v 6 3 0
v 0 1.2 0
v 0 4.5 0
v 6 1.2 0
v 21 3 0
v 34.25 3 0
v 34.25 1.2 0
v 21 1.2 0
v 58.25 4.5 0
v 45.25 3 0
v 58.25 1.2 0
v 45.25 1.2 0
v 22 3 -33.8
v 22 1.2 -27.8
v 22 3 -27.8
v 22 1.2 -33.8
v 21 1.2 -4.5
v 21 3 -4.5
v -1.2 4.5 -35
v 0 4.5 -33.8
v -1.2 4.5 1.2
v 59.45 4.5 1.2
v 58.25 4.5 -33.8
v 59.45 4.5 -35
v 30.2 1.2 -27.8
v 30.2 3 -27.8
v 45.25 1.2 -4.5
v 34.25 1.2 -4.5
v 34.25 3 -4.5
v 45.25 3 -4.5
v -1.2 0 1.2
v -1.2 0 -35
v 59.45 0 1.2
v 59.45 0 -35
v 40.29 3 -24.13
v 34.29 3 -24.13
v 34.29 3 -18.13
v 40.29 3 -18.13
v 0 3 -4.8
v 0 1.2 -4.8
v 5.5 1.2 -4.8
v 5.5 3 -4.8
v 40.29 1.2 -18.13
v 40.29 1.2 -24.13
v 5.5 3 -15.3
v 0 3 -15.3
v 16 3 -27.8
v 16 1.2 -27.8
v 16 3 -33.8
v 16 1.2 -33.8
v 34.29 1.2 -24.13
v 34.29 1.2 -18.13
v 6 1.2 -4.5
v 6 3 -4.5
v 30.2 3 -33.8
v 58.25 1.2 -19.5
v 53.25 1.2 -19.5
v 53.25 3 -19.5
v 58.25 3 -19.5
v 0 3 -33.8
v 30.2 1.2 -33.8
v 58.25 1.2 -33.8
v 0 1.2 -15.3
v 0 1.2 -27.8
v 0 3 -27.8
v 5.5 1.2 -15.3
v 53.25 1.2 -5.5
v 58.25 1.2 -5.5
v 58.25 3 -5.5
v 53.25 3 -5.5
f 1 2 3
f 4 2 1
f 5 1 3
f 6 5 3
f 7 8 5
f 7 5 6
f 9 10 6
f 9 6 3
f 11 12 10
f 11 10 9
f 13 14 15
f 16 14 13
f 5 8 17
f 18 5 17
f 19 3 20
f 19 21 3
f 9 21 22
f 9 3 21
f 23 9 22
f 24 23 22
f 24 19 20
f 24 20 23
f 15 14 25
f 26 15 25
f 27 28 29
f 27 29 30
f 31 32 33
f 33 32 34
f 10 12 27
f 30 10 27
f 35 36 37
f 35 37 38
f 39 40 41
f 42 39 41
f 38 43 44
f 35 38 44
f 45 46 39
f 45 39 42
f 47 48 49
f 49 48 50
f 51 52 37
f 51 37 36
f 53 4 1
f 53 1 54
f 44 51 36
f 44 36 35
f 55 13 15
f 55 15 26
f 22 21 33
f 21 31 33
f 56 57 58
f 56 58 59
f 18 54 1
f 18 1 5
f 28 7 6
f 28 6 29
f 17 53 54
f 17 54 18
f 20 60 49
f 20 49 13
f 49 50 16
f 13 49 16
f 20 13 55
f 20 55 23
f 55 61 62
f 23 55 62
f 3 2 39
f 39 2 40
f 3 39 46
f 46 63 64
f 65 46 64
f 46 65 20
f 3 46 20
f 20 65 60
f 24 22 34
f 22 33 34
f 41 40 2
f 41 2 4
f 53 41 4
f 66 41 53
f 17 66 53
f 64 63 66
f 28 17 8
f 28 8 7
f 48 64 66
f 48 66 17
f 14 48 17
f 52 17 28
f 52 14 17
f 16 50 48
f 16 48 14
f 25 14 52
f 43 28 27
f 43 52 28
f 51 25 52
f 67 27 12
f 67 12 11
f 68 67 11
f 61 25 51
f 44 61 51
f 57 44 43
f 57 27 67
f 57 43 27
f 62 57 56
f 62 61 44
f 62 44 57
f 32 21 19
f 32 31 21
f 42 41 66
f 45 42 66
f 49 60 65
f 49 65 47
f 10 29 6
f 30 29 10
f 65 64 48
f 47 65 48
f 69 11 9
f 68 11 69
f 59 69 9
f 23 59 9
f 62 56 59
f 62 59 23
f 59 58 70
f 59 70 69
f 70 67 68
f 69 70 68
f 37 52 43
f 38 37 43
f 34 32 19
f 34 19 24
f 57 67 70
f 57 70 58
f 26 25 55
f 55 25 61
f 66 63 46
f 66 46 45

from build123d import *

# Parameters (mm, degrees)
SKETCH2_W           = 60.65
SKETCH2_H           = 36.2
BOSS_EXTRUDE1_DEPTH = 1.2
SKETCH3_W           = 60.65
SKETCH3_H           = 36.2
SKETCH3_W_2         = 58.25
SKETCH3_H_2         = 33.8
BOSS_EXTRUDE2_DEPTH = 3.3
SKETCH4_W           = 16
SKETCH4_H           = 6
SKETCH4_W_2         = 5.5
SKETCH4_H_2         = 10.5
SKETCH4_W_3         = 11
SKETCH4_H_3         = 4.5
SKETCH4_W_4         = 15
SKETCH4_W_5         = 5
SKETCH4_H_4         = 14
SKETCH4_W_6         = 8.2
SKETCH4_W_7         = 6
BOSS_EXTRUDE3_DEPTH = 1.8


with BuildPart() as part:
    # Sketch2 → Boss-Extrude1 (new body)
    with BuildSketch(Plane(origin=(0, 0, 0), x_dir=(1, 0, 0), z_dir=(0, 1, 0))):
        with Locations((29.125, 16.9)):
            Rectangle(SKETCH2_W, SKETCH2_H)
    extrude(amount=BOSS_EXTRUDE1_DEPTH)

    # Sketch3 → Boss-Extrude2 (add)
    with BuildSketch(Plane(origin=(0, 1.2, 0), x_dir=(1, 0, 0), z_dir=(0, 1, 0))):
        with Locations((29.125, 16.9)):
            Rectangle(SKETCH3_W, SKETCH3_H)
        with Locations((29.125, 16.9)):
            Rectangle(SKETCH3_W_2, SKETCH3_H_2, mode=Mode.SUBTRACT)
    extrude(amount=BOSS_EXTRUDE2_DEPTH)

    # Sketch4 → Boss-Extrude3 (add)
    with BuildSketch(Plane(origin=(0, 1.2, 0), x_dir=(1, 0, 0), z_dir=(0, 1, 0))):
        with Locations((8, 30.8)):
            Rectangle(SKETCH4_W, SKETCH4_H)
        with Locations((2.75, 10.05)):
            Rectangle(SKETCH4_W_2, SKETCH4_H_2)
        with Locations((39.75, 2.25)):
            Rectangle(SKETCH4_W_3, SKETCH4_H_3)
        with Locations((13.5, 2.25)):
            Rectangle(SKETCH4_W_4, SKETCH4_H_3)
        with Locations((55.75, 12.5)):
            Rectangle(SKETCH4_W_5, SKETCH4_H_4)
        with Locations((26.1, 30.8)):
            Rectangle(SKETCH4_W_6, SKETCH4_H)
        with Locations((37.29, 21.13)):
            Rectangle(SKETCH4_W_7, SKETCH4_H)
    extrude(amount=BOSS_EXTRUDE3_DEPTH)


solid = part.part
